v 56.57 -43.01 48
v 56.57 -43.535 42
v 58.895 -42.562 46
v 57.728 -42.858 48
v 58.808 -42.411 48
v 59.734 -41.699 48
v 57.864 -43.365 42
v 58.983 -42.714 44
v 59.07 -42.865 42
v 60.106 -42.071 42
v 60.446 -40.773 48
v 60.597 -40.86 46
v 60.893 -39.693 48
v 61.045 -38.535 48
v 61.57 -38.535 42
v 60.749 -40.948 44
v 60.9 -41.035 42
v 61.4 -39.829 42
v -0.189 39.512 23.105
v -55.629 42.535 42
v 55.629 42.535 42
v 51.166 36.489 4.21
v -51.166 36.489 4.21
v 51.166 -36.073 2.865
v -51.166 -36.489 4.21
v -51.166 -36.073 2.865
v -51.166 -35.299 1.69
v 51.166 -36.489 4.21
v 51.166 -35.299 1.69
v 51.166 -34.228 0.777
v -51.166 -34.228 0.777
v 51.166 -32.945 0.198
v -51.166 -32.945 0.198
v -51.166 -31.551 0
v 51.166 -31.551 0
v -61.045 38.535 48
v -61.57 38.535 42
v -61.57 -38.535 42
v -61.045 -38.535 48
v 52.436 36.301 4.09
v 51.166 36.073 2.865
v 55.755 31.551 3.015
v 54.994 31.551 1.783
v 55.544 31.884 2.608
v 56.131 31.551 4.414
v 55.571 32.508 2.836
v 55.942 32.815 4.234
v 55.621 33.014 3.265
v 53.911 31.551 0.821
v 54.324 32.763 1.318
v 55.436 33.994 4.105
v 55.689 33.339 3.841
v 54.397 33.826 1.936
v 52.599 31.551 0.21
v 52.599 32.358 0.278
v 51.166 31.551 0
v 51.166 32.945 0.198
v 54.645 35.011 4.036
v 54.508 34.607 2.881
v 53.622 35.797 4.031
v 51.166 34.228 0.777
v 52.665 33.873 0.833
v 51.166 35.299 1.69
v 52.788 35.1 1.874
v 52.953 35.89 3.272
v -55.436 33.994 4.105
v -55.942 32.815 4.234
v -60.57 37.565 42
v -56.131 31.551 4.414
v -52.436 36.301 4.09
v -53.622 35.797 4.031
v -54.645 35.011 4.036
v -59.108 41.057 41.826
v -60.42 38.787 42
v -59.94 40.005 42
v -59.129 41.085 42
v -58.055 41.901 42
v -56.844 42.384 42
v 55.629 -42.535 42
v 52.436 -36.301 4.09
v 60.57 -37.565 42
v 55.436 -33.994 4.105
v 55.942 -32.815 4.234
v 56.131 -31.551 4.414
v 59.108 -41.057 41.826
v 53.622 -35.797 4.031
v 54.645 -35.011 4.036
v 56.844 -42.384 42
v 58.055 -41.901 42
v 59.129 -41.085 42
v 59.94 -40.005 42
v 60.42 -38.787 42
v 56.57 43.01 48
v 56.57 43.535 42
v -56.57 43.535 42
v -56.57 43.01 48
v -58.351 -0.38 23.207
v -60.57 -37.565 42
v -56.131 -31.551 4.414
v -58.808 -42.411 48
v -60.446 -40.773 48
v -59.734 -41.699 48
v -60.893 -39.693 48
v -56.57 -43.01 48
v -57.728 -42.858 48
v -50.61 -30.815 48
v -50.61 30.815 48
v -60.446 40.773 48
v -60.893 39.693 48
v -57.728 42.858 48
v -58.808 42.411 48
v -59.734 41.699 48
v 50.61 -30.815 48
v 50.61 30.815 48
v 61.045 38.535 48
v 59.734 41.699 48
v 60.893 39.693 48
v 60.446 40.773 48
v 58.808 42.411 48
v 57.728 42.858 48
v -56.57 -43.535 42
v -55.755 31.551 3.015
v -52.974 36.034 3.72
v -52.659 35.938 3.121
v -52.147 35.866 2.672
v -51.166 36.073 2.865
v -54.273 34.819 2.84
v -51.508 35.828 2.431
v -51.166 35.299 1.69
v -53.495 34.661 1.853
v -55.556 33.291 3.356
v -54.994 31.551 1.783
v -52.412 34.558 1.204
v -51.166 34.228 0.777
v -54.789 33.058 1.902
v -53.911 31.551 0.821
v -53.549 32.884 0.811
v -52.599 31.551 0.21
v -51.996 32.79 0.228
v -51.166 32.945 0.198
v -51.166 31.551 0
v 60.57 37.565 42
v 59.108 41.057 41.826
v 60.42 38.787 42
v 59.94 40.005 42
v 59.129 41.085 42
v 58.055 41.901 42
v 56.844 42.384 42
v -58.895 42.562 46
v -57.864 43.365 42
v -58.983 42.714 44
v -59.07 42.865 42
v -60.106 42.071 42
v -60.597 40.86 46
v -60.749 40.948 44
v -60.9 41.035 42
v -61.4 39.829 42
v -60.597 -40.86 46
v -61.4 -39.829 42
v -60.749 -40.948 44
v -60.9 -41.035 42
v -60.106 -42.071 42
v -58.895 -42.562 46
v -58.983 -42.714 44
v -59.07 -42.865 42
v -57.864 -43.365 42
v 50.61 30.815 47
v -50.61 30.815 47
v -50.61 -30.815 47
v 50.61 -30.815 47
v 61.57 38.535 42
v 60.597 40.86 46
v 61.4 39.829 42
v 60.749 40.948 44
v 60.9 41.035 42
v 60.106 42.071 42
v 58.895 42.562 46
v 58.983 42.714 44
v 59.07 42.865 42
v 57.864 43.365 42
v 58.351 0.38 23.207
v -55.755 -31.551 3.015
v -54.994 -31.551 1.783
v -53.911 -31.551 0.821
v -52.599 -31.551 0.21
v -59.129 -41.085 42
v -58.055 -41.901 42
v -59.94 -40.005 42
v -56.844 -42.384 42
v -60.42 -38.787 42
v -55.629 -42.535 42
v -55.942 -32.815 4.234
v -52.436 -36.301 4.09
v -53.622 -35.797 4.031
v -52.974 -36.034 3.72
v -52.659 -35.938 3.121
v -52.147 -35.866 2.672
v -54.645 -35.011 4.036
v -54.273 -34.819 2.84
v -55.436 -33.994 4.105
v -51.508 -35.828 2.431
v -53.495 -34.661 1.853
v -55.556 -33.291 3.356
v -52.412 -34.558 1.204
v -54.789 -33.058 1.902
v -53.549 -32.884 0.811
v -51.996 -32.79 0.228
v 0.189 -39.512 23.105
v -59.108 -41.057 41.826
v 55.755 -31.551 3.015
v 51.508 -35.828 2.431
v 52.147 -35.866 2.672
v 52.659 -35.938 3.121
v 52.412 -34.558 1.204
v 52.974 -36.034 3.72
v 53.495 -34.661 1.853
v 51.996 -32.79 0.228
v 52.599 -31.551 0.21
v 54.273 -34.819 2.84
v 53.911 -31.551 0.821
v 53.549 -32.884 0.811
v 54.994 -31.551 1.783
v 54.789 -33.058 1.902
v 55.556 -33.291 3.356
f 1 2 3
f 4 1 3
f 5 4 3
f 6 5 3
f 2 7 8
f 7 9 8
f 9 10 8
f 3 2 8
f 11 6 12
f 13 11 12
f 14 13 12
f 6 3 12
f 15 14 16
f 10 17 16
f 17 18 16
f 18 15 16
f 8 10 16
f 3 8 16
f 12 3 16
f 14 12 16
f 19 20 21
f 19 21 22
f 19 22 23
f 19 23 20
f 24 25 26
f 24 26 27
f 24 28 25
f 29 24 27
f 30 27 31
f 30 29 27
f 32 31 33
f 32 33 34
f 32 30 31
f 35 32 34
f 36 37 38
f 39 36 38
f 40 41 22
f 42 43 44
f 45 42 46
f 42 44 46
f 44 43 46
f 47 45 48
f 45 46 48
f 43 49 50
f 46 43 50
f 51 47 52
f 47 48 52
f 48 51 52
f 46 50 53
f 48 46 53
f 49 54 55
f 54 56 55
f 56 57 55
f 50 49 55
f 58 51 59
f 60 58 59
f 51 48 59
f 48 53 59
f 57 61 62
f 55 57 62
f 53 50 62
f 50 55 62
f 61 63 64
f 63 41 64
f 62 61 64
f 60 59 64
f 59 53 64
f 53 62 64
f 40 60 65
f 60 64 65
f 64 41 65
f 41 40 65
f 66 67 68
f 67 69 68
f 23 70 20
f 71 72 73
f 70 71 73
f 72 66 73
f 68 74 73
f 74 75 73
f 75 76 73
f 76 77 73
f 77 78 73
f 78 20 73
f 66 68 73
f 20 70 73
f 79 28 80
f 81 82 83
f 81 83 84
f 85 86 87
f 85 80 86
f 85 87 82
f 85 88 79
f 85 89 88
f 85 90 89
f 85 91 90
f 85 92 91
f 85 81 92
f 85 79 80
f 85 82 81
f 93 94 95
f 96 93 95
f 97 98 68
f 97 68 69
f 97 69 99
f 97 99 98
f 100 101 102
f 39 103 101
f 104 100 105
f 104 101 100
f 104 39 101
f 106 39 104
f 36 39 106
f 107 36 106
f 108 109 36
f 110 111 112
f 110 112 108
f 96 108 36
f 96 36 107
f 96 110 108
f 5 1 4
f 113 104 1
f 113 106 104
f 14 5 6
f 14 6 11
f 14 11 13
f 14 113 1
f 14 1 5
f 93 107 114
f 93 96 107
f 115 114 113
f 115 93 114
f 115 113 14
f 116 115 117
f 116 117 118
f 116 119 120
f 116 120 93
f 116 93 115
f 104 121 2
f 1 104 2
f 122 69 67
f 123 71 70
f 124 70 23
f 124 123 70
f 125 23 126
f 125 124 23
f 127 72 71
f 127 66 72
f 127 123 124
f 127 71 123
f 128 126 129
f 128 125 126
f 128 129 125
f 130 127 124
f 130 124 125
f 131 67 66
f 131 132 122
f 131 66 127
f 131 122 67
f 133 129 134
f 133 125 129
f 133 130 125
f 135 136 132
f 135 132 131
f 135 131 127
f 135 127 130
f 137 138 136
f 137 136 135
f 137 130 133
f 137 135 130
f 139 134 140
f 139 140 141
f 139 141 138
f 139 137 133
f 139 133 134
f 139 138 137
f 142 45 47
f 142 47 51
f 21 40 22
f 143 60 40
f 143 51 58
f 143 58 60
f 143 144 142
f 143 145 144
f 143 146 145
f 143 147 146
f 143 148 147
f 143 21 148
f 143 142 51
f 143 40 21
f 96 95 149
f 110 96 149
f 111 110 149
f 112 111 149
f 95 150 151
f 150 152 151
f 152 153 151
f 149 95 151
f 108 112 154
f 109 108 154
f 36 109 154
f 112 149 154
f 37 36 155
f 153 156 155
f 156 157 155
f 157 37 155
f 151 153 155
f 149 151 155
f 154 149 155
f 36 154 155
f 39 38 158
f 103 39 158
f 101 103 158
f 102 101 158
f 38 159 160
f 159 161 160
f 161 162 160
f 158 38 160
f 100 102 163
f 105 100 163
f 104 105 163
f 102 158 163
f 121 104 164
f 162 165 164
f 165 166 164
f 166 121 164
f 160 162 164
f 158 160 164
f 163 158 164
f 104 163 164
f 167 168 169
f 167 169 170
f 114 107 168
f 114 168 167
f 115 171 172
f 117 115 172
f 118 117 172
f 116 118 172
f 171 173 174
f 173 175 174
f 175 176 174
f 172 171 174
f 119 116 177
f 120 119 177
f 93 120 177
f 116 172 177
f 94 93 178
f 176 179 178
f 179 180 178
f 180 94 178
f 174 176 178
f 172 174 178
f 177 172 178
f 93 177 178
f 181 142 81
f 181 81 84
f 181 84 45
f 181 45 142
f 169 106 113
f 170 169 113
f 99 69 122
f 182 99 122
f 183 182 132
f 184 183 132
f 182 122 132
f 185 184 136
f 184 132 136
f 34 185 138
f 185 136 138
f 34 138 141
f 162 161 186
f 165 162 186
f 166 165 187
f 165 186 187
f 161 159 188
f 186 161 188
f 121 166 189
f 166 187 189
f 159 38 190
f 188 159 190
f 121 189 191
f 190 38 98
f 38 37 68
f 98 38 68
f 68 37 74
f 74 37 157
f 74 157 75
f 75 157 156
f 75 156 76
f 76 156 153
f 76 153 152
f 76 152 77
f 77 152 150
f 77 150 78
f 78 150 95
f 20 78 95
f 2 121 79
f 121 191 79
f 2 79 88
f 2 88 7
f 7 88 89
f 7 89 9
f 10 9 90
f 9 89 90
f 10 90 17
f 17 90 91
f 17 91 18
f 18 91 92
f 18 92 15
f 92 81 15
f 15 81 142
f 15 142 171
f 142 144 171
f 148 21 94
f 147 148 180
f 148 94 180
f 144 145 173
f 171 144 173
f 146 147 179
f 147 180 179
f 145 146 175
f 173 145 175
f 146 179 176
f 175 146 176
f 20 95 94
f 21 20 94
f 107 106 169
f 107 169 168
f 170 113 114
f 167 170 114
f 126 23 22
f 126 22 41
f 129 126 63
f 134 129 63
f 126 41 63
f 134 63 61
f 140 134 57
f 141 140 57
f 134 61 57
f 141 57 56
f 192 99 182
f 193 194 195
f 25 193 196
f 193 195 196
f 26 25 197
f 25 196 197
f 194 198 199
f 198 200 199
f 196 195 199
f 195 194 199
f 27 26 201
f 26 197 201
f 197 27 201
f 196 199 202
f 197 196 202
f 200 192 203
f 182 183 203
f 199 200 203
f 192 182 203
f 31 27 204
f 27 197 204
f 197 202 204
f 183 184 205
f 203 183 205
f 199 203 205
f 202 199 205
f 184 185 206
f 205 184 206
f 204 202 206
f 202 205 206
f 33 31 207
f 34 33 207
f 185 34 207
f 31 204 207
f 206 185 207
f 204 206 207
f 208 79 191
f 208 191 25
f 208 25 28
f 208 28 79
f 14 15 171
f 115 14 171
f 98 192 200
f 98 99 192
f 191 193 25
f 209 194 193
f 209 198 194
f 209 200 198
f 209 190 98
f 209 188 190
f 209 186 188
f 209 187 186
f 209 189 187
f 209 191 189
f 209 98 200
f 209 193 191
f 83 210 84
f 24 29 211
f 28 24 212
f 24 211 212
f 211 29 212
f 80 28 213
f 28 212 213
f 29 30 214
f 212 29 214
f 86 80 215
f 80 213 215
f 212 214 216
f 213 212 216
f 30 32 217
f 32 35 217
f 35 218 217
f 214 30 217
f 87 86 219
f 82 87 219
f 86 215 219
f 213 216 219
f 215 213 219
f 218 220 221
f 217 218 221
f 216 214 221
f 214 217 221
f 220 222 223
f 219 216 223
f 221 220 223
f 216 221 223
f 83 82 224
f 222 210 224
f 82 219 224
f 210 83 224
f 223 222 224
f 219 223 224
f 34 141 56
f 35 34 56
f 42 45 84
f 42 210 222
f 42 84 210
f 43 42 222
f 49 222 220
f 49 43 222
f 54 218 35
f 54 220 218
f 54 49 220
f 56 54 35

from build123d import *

# Parameters (mm, degrees)
F0_W      = 111.22
F0_H      = 71.63
F2_W      = 121.14
F2_H      = 85.07
F4_R      = 5
F5_W      = 123.14
F5_H      = 87.07
F6_DEPTH  = 6
F7_W      = 101.22
F7_H      = 61.63
F8_DEPTH  = 1
F9_R      = 5
F10_SIZE2 = 5.99999
F10_SIZE  = 0.524922


# Not quite as in the source:
# - a fillet or chamfer is up to 0.001 mm smaller than in the source, because OpenCascade refuses the exact size


with BuildPart() as f3:
    # F0 (on Top) → F3 section 0
    with BuildSketch(Plane.XY):
        Rectangle(F0_W, F0_H)
    # F2 (on offset) → F3 section 1
    with BuildSketch(Plane.XY.offset(42)):
        Rectangle(F2_W, F2_H)
    loft()

    # F4
    f4_edges = [f3.edges().sort_by_distance(p)[0] for p in [
        (-55.61, 0, 0),
        (-58.09, 39.175, 21),
        (0, 35.815, 0),
        (55.61, 0, 0),
        (58.09, 39.175, 21),
        (-58.09, -39.175, 21),
        (0, -35.815, 0),
        (58.09, -39.175, 21),
    ]]
    fillet(f4_edges, radius=F4_R)

    # F5 (on face) → F6 (join)
    with BuildSketch(Plane.XY.offset(42)):
        Rectangle(F5_W, F5_H)
        with BuildLine():
            Line((60.57, 37.5652286365), (60.57, -37.5652286365))
            add(Edge.make_bspline(
                [(60.57, -37.5652286365), (60.57, -37.8677629795), (60.5484249291, -38.1785474247), (60.5029654317, -38.4950915318), (60.4316524162, -38.8141360023), (60.3333363666, -39.1316751054), (60.0821499269, -39.7565973164), (59.9290553292, -40.0639382754), (59.7486936762, -40.3612591505), (59.5421641644, -40.6440796366), (59.3119172372, -40.9083408285), (58.8238966802, -41.3807158702), (58.5682195509, -41.5910650721), (58.2970619174, -41.7793580892), (58.013945443, -41.9437291503), (57.7226574277, -42.0834034649), (57.1273207787, -42.3149957608), (56.8231561933, -42.4063160322), (56.5180078096, -42.4725842951), (56.2153860403, -42.5148862736), (55.9181609136, -42.535), (55.628544141, -42.535)],
                knots=[0, 0, 0, 0, 0, 0, 0, 0.2552622354, 0.2552622354, 0.2552622354, 0.2552622354, 0.2552622354, 0.5115672797, 0.5115672797, 0.5115672797, 0.5115672797, 0.5115672797, 0.7543107062, 0.7543107062, 0.7543107062, 0.7543107062, 0.7543107062, 1, 1, 1, 1, 1, 1, 1], degree=6))
            Line((55.628544141, -42.535), (-55.628544141, -42.535))
            add(Edge.make_bspline(
                [(-60.57, -37.5652286365), (-60.57, -37.8677629794), (-60.5484249292, -38.1785474246), (-60.5029654317, -38.4950915316), (-60.4316524163, -38.814136002), (-60.3333363667, -39.1316751051), (-60.0821499271, -39.756597316), (-59.9290553294, -40.0639382751), (-59.7486936764, -40.3612591501), (-59.5421641646, -40.6440796363), (-59.3119172375, -40.9083408282), (-58.8238966804, -41.38071587), (-58.5682195512, -41.591065072), (-58.2970619176, -41.7793580891), (-58.0139454431, -41.9437291502), (-57.7226574278, -42.0834034648), (-57.1273207787, -42.3149957608), (-56.8231561933, -42.4063160322), (-56.5180078096, -42.4725842951), (-56.2153860403, -42.5148862736), (-55.9181609136, -42.535), (-55.628544141, -42.535)],
                knots=[0, 0, 0, 0, 0, 0, 0, 0.2552622353, 0.2552622353, 0.2552622353, 0.2552622353, 0.2552622353, 0.5115672797, 0.5115672797, 0.5115672797, 0.5115672797, 0.5115672797, 0.7543107062, 0.7543107062, 0.7543107062, 0.7543107062, 0.7543107062, 1, 1, 1, 1, 1, 1, 1], degree=6))
            Line((-60.57, -37.5652286365), (-60.57, 37.5652286365))
            add(Edge.make_bspline(
                [(-55.628544141, 42.535), (-55.9165579294, 42.535), (-56.2120960387, 42.5151083241), (-56.5129833201, 42.4732846379), (-56.8164007689, 42.4077788273), (-57.1189028719, 42.3175153178), (-57.7138767296, 42.0875473103), (-58.0063798227, 41.9479897602), (-58.2907253957, 41.7835490477), (-58.5630840084, 41.5949938834), (-58.8198912965, 41.3842007295), (-59.3081604347, 40.9123831651), (-59.5378156039, 40.6494264179), (-59.7439719788, 40.3680131083), (-59.924197311, 40.0721470067), (-60.0773872558, 39.7662523131), (-60.3304237584, 39.1410513034), (-60.4299622755, 38.821673494), (-60.5021575431, 38.500700594), (-60.5481693204, 38.1822186305), (-60.57, 37.8695496868), (-60.57, 37.5652286365)],
                knots=[0, 0, 0, 0, 0, 0, 0, 0.2443294294, 0.2443294294, 0.2443294294, 0.2443294294, 0.2443294294, 0.4879249993, 0.4879249993, 0.4879249993, 0.4879249993, 0.4879249993, 0.7432302237, 0.7432302237, 0.7432302237, 0.7432302237, 0.7432302237, 1, 1, 1, 1, 1, 1, 1], degree=6))
            Line((-55.628544141, 42.535), (55.628544141, 42.535))
            add(Edge.make_bspline(
                [(60.57, 37.5652286365), (60.57, 37.8677629794), (60.5484249292, 38.1785474246), (60.5029654317, 38.4950915316), (60.4316524163, 38.814136002), (60.3333363667, 39.1316751051), (60.0821499271, 39.756597316), (59.9290553294, 40.0639382751), (59.7486936764, 40.3612591501), (59.5421641646, 40.6440796363), (59.3119172375, 40.9083408282), (58.8238966804, 41.38071587), (58.5682195512, 41.591065072), (58.2970619176, 41.7793580891), (58.0139454431, 41.9437291502), (57.7226574278, 42.0834034648), (57.1273207787, 42.3149957608), (56.8231561933, 42.4063160322), (56.5180078096, 42.4725842951), (56.2153860403, 42.5148862736), (55.9181609136, 42.535), (55.628544141, 42.535)],
                knots=[0, 0, 0, 0, 0, 0, 0, 0.2552622353, 0.2552622353, 0.2552622353, 0.2552622353, 0.2552622353, 0.5115672797, 0.5115672797, 0.5115672797, 0.5115672797, 0.5115672797, 0.7543107062, 0.7543107062, 0.7543107062, 0.7543107062, 0.7543107062, 1, 1, 1, 1, 1, 1, 1], degree=6))
        make_face(mode=Mode.SUBTRACT)
        with BuildLine():
            add(Edge.make_bspline(
                [(60.57, -37.5652286365), (60.57, -37.8677629795), (60.5484249291, -38.1785474247), (60.5029654317, -38.4950915318), (60.4316524162, -38.8141360023), (60.3333363666, -39.1316751054), (60.0821499269, -39.7565973164), (59.9290553292, -40.0639382754), (59.7486936762, -40.3612591505), (59.5421641644, -40.6440796366), (59.3119172372, -40.9083408285), (58.8238966802, -41.3807158702), (58.5682195509, -41.5910650721), (58.2970619174, -41.7793580892), (58.013945443, -41.9437291503), (57.7226574277, -42.0834034649), (57.1273207787, -42.3149957608), (56.8231561933, -42.4063160322), (56.5180078096, -42.4725842951), (56.2153860403, -42.5148862736), (55.9181609136, -42.535), (55.628544141, -42.535)],
                knots=[0, 0, 0, 0, 0, 0, 0, 0.2552622354, 0.2552622354, 0.2552622354, 0.2552622354, 0.2552622354, 0.5115672797, 0.5115672797, 0.5115672797, 0.5115672797, 0.5115672797, 0.7543107062, 0.7543107062, 0.7543107062, 0.7543107062, 0.7543107062, 1, 1, 1, 1, 1, 1, 1], degree=6))
            Line((60.57, -37.5652286365), (60.57, 37.5652286365))
            add(Edge.make_bspline(
                [(60.57, 37.5652286365), (60.57, 37.8677629794), (60.5484249292, 38.1785474246), (60.5029654317, 38.4950915316), (60.4316524163, 38.814136002), (60.3333363667, 39.1316751051), (60.0821499271, 39.756597316), (59.9290553294, 40.0639382751), (59.7486936764, 40.3612591501), (59.5421641646, 40.6440796363), (59.3119172375, 40.9083408282), (58.8238966804, 41.38071587), (58.5682195512, 41.591065072), (58.2970619176, 41.7793580891), (58.0139454431, 41.9437291502), (57.7226574278, 42.0834034648), (57.1273207787, 42.3149957608), (56.8231561933, 42.4063160322), (56.5180078096, 42.4725842951), (56.2153860403, 42.5148862736), (55.9181609136, 42.535), (55.628544141, 42.535)],
                knots=[0, 0, 0, 0, 0, 0, 0, 0.2552622353, 0.2552622353, 0.2552622353, 0.2552622353, 0.2552622353, 0.5115672797, 0.5115672797, 0.5115672797, 0.5115672797, 0.5115672797, 0.7543107062, 0.7543107062, 0.7543107062, 0.7543107062, 0.7543107062, 1, 1, 1, 1, 1, 1, 1], degree=6))
            Line((55.628544141, 42.535), (-55.628544141, 42.535))
            add(Edge.make_bspline(
                [(-55.628544141, 42.535), (-55.9165579294, 42.535), (-56.2120960387, 42.5151083241), (-56.5129833201, 42.4732846379), (-56.8164007689, 42.4077788273), (-57.1189028719, 42.3175153178), (-57.7138767296, 42.0875473103), (-58.0063798227, 41.9479897602), (-58.2907253957, 41.7835490477), (-58.5630840084, 41.5949938834), (-58.8198912965, 41.3842007295), (-59.3081604347, 40.9123831651), (-59.5378156039, 40.6494264179), (-59.7439719788, 40.3680131083), (-59.924197311, 40.0721470067), (-60.0773872558, 39.7662523131), (-60.3304237584, 39.1410513034), (-60.4299622755, 38.821673494), (-60.5021575431, 38.500700594), (-60.5481693204, 38.1822186305), (-60.57, 37.8695496868), (-60.57, 37.5652286365)],
                knots=[0, 0, 0, 0, 0, 0, 0, 0.2443294294, 0.2443294294, 0.2443294294, 0.2443294294, 0.2443294294, 0.4879249993, 0.4879249993, 0.4879249993, 0.4879249993, 0.4879249993, 0.7432302237, 0.7432302237, 0.7432302237, 0.7432302237, 0.7432302237, 1, 1, 1, 1, 1, 1, 1], degree=6))
            Line((-60.57, 37.5652286365), (-60.57, -37.5652286365))
            add(Edge.make_bspline(
                [(-60.57, -37.5652286365), (-60.57, -37.8677629794), (-60.5484249292, -38.1785474246), (-60.5029654317, -38.4950915316), (-60.4316524163, -38.814136002), (-60.3333363667, -39.1316751051), (-60.0821499271, -39.756597316), (-59.9290553294, -40.0639382751), (-59.7486936764, -40.3612591501), (-59.5421641646, -40.6440796363), (-59.3119172375, -40.9083408282), (-58.8238966804, -41.38071587), (-58.5682195512, -41.591065072), (-58.2970619176, -41.7793580891), (-58.0139454431, -41.9437291502), (-57.7226574278, -42.0834034648), (-57.1273207787, -42.3149957608), (-56.8231561933, -42.4063160322), (-56.5180078096, -42.4725842951), (-56.2153860403, -42.5148862736), (-55.9181609136, -42.535), (-55.628544141, -42.535)],
                knots=[0, 0, 0, 0, 0, 0, 0, 0.2552622353, 0.2552622353, 0.2552622353, 0.2552622353, 0.2552622353, 0.5115672797, 0.5115672797, 0.5115672797, 0.5115672797, 0.5115672797, 0.7543107062, 0.7543107062, 0.7543107062, 0.7543107062, 0.7543107062, 1, 1, 1, 1, 1, 1, 1], degree=6))
            Line((-55.628544141, -42.535), (55.628544141, -42.535))
        make_face()
    extrude(amount=F6_DEPTH)

    # F7 (on face) → F8 (cut)
    with BuildSketch(Plane.XY.offset(48)):
        Rectangle(F7_W, F7_H)
    extrude(amount=-F8_DEPTH, mode=Mode.SUBTRACT)

    # F9
    f9_edges = [f3.edges().sort_by_distance(p)[0] for p in [
        (-61.57, 43.535, 45),
        (-61.57, -43.535, 45),
        (61.57, -43.535, 45),
        (61.57, 43.535, 45),
    ]]
    fillet(f9_edges, radius=F9_R)

    # F10 (size 0.5249319812 and 6 in the source; OpenCascade refuses exactly that, so slightly less here)
    f10_edges = [f3.edges().sort_by_distance(p)[0] for p in [
        (61.57, 0, 48),
        (60.105534, 42.070534, 48),
        (0, 43.535, 48),
        (-60.105534, 42.070534, 48),
        (-61.57, 0, 48),
        (-60.105534, -42.070534, 48),
        (0, -43.535, 48),
        (60.105534, -42.070534, 48),
    ]]
    f10_side = f3.faces().sort_by_distance((60.061867, 0, 48))[0]
    chamfer(f10_edges, length=F10_SIZE, length2=F10_SIZE2, reference=f10_side)


solid = f3.part
